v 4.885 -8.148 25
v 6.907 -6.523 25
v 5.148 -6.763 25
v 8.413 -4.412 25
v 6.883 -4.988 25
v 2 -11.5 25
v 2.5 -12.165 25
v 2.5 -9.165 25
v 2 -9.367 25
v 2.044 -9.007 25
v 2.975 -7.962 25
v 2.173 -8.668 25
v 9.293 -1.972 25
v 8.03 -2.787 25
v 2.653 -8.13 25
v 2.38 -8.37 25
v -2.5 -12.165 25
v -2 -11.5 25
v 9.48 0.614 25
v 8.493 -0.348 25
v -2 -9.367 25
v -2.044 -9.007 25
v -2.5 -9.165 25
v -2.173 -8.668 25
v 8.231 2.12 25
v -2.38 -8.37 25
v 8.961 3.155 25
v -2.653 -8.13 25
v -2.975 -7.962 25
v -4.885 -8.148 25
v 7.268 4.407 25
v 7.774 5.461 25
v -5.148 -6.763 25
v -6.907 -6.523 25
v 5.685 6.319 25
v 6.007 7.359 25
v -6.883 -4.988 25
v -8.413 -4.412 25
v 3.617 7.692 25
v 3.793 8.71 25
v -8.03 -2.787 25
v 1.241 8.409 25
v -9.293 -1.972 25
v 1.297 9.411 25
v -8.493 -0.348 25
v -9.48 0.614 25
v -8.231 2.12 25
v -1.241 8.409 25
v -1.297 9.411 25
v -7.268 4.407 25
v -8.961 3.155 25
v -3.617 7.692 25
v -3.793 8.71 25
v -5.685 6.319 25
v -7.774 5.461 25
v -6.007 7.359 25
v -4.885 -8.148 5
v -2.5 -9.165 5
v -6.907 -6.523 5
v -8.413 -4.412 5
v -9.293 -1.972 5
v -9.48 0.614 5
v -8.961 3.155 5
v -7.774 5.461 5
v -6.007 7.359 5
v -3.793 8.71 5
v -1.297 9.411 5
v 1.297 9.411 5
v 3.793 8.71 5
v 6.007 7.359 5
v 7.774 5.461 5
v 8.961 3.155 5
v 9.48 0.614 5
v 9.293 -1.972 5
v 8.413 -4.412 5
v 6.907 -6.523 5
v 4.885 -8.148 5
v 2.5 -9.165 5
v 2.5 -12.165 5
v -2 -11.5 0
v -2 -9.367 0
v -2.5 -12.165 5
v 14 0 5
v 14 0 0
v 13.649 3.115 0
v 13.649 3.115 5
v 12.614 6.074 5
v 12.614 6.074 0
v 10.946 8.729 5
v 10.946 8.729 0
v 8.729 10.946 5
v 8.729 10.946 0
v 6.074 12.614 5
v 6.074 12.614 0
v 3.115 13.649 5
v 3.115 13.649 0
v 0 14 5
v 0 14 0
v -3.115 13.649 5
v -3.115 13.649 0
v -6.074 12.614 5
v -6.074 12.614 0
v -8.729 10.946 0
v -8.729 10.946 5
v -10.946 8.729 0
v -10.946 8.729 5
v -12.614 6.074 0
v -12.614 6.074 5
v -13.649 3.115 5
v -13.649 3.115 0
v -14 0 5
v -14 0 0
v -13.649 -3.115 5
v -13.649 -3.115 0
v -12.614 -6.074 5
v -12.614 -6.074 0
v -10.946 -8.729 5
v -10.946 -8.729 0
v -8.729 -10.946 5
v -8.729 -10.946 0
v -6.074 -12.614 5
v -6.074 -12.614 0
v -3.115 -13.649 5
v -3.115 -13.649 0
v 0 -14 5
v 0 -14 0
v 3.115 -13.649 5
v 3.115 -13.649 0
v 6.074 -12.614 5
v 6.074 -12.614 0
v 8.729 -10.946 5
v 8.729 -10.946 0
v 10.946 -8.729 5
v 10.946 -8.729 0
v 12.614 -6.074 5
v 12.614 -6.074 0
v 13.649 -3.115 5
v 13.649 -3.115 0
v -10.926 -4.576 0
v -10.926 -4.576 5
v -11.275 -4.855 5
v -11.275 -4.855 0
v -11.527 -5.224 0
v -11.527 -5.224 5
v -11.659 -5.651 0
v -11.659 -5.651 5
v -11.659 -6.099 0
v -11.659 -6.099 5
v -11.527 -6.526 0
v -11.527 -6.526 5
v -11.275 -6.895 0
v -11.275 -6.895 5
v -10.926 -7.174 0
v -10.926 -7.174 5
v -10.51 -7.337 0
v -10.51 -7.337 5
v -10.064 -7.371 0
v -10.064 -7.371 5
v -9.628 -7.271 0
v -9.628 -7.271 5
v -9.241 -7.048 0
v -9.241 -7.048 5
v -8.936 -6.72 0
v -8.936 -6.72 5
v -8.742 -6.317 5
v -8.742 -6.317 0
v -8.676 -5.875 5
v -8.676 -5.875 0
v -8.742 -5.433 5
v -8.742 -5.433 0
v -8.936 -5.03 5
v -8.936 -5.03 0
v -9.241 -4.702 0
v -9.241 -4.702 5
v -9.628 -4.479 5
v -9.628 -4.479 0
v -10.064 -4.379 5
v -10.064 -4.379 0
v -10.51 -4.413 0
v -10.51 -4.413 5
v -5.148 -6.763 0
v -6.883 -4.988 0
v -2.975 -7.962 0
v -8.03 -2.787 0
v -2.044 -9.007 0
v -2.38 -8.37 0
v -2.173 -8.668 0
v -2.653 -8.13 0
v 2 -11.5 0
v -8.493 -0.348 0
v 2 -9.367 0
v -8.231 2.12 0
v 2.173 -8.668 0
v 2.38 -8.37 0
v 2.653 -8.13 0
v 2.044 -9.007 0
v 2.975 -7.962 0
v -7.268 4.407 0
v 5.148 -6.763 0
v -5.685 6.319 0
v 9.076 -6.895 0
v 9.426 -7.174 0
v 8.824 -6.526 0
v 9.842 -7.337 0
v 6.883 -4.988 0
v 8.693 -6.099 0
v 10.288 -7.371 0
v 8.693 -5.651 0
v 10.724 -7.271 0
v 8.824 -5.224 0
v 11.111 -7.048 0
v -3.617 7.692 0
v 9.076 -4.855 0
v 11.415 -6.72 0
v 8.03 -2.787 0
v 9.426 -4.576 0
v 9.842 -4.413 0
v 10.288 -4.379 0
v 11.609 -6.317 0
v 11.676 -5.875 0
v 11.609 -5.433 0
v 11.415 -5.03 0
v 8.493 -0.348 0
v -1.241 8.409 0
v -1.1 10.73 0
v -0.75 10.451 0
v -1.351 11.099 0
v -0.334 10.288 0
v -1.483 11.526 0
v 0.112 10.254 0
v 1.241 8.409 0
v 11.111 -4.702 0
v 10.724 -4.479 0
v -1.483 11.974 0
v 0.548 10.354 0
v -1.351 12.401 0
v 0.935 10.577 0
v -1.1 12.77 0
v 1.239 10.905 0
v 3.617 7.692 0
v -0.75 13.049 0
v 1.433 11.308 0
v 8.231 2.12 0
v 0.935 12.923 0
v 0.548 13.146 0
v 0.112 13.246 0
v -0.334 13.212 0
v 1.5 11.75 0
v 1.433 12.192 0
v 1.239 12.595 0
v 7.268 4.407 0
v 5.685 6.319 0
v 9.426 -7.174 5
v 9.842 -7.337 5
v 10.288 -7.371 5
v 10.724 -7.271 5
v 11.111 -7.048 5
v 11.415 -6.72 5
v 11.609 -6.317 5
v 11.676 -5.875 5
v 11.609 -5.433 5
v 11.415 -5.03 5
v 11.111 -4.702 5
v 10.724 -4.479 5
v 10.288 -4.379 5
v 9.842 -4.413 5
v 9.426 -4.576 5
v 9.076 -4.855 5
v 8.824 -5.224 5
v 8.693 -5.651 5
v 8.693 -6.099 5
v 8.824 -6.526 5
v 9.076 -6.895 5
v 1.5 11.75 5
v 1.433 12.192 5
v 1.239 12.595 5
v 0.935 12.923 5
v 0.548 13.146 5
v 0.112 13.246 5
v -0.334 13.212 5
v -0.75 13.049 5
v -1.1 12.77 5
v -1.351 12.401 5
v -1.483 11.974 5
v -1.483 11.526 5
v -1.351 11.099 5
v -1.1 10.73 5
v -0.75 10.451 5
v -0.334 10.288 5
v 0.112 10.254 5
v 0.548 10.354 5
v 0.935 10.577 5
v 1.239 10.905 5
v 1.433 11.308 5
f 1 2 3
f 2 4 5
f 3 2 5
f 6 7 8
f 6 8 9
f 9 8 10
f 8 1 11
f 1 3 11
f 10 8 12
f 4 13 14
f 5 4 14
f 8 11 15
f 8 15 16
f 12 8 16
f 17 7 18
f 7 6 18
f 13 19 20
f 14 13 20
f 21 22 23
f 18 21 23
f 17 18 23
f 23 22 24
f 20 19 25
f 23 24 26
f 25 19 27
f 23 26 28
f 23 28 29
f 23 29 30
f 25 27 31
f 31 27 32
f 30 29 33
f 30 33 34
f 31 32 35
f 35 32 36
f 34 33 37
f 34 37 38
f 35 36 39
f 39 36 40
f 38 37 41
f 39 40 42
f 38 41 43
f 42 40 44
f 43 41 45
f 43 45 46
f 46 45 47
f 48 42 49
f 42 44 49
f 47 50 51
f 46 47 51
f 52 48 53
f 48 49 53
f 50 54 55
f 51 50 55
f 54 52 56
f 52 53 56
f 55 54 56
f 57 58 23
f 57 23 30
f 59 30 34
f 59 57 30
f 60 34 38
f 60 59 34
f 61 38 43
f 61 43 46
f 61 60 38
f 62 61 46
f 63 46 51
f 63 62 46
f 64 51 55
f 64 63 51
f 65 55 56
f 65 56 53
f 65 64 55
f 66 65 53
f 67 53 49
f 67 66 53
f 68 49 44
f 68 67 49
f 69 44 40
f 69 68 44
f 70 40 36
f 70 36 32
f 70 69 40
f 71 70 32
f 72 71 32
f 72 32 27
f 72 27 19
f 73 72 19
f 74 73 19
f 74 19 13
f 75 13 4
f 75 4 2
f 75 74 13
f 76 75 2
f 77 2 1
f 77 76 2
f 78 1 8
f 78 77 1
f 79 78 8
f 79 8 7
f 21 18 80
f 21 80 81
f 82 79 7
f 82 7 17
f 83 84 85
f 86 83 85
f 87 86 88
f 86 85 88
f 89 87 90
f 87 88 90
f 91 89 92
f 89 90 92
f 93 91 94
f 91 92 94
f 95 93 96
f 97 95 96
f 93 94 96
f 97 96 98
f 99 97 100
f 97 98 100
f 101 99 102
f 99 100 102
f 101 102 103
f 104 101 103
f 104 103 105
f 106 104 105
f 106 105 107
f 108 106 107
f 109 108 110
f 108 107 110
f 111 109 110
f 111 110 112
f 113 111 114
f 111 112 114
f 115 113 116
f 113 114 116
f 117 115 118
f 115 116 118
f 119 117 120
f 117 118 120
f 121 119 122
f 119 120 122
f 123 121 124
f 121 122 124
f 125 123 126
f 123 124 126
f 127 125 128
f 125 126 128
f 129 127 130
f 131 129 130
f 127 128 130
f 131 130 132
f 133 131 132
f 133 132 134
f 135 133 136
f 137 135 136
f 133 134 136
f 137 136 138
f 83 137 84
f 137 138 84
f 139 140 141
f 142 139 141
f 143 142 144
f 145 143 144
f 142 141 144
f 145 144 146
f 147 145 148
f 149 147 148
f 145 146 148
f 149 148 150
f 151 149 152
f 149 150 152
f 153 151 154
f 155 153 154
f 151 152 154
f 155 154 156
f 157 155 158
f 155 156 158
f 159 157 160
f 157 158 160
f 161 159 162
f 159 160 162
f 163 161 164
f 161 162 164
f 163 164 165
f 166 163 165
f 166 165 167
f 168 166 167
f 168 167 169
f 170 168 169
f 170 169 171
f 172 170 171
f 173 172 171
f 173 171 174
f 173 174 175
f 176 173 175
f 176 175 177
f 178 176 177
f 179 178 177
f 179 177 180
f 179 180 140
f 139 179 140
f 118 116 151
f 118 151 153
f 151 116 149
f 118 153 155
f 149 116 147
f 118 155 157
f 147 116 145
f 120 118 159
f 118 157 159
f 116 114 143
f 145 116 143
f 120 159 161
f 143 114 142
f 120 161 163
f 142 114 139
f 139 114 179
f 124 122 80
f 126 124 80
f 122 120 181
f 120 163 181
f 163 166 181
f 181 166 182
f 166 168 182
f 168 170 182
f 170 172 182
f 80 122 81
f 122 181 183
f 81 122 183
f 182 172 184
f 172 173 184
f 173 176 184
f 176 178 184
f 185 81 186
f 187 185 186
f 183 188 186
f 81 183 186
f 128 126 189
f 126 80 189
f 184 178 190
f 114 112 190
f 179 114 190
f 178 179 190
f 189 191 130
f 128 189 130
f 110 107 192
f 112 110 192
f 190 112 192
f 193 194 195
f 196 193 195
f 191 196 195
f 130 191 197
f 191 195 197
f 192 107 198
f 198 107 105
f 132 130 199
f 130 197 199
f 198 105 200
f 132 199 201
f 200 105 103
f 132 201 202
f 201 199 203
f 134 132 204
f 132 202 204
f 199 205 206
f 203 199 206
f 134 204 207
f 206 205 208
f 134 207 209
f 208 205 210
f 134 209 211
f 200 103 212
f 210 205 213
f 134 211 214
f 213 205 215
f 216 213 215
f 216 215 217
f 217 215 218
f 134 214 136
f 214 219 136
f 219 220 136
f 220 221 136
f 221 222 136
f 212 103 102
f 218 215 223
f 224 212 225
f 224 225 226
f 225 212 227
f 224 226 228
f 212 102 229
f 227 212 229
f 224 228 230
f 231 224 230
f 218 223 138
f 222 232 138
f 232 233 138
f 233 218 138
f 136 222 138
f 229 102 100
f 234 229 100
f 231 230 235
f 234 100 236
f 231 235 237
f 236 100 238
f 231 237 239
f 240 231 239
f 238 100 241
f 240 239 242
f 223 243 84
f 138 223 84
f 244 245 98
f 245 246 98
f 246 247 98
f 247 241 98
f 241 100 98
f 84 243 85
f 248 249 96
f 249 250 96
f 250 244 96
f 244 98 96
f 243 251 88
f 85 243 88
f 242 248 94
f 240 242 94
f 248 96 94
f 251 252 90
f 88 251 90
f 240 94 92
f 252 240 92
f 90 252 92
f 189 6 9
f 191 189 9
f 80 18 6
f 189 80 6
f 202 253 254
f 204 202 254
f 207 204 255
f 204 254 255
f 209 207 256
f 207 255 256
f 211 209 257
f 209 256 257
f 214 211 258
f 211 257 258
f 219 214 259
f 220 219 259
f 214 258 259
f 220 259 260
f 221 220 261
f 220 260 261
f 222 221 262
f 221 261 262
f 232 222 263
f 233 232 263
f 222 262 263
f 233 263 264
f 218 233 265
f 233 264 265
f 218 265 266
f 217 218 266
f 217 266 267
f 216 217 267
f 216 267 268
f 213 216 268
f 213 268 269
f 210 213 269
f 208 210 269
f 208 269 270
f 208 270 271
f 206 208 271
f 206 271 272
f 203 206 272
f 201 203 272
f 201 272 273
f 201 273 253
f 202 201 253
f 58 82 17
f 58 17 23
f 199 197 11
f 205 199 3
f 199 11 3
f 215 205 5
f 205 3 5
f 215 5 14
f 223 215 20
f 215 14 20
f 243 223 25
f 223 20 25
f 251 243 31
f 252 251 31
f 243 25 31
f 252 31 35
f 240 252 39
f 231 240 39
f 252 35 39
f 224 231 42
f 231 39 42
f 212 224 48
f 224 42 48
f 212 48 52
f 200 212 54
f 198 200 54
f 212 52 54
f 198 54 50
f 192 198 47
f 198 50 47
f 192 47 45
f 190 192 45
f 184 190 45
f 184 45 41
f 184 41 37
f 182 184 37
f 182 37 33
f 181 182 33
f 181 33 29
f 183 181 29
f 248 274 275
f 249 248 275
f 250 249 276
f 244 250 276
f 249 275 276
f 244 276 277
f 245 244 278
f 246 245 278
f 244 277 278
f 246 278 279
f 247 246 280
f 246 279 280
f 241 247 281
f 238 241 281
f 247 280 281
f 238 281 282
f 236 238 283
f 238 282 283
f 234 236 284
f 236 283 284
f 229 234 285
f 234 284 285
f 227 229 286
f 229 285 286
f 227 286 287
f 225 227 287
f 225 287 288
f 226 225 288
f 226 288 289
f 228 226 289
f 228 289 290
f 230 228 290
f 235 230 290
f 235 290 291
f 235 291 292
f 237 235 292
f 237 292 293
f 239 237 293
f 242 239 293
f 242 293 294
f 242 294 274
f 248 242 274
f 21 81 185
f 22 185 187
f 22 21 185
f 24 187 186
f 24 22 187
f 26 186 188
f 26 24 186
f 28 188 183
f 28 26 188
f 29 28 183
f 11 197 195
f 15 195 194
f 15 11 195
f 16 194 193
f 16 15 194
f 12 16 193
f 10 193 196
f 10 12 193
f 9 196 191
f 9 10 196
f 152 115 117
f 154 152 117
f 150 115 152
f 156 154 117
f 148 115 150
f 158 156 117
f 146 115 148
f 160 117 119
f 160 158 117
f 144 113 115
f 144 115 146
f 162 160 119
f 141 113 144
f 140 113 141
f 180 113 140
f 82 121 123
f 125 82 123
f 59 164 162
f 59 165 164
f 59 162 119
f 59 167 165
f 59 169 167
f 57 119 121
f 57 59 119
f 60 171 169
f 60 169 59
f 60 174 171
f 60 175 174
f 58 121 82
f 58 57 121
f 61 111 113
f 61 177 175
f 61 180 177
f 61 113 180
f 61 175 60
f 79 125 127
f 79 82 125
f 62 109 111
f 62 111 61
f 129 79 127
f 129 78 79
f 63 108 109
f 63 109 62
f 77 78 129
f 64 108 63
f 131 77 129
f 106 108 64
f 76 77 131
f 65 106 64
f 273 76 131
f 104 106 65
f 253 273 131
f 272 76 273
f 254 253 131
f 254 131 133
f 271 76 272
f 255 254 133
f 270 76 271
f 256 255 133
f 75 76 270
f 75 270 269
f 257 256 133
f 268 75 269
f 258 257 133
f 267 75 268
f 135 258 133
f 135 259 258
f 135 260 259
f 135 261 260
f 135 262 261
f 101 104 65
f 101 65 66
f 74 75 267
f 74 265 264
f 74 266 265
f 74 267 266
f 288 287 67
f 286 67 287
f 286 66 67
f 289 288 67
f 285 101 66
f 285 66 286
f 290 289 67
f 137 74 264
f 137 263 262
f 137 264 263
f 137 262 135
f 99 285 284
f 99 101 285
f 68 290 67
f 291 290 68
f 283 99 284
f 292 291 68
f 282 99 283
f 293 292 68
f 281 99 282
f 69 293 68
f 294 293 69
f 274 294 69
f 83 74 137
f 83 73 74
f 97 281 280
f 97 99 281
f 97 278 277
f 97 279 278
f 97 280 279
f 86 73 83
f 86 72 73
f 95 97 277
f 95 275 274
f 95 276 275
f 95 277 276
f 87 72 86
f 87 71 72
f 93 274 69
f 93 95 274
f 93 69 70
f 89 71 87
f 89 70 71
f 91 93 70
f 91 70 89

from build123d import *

# Parameters (mm, degrees)
SKETCH1_R           = 14
BOSS_EXTRUDE1_DEPTH = 5
BOSS_EXTRUDE3_DEPTH = 20
SKETCH3_R           = 8.5
CUT_EXTRUDE1_DEPTH  = 26
SKETCH5_W           = 4
SKETCH5_H           = 11.5
CUT_EXTRUDE3_DEPTH  = 26
SKETCH6_R           = 1.5
CUT_EXTRUDE4_DEPTH  = 6
CIRPATTERN1_COUNT   = 3
FILLET1_R           = 1.5


with BuildPart() as part:
    # Sketch1 → Boss-Extrude1 (new body)
    with BuildSketch(Plane.XY):
        Circle(SKETCH1_R)
    extrude(amount=BOSS_EXTRUDE1_DEPTH)

    # Sketch2 → Boss-Extrude3 (add)
    with BuildSketch(Plane.XY.offset(5)):
        with BuildLine():
            Line((2.5, -9.16515139), (2.5, -12.16515139))
            Line((2.5, -12.16515139), (-2.5, -12.16515139))
            Line((-2.5, -12.16515139), (-2.5, -9.16515139))
            ThreePointArc((-2.5, -9.16515139), (0, 9.5), (2.5, -9.16515139))
        make_face()
    extrude(amount=BOSS_EXTRUDE3_DEPTH)

    # Sketch3 → Cut-Extrude1 (cut, through all)
    with BuildSketch(Plane.XY.offset(25)):
        Circle(SKETCH3_R)
    extrude(amount=-CUT_EXTRUDE1_DEPTH, mode=Mode.SUBTRACT)

    # Sketch5 → Cut-Extrude3 (cut, through all)
    with BuildSketch(Plane.XY.offset(25)):
        with Locations((0, -5.75)):
            Rectangle(SKETCH5_W, SKETCH5_H)
    extrude(amount=-CUT_EXTRUDE3_DEPTH, mode=Mode.SUBTRACT)

    # Sketch6 → Cut-Extrude4 (cut, through all)
    with BuildSketch(Plane.XY.offset(5)):
        with Locations((0, 11.75)):
            Circle(SKETCH6_R)
    cut_extrude4 = extrude(amount=-CUT_EXTRUDE4_DEPTH, mode=Mode.SUBTRACT)

    # CirPattern1: Cut-Extrude4 ×3 about axis
    cirpattern1_axis = Axis((0, 0, 0), (0, 0, 1))
    for i in range(1, CIRPATTERN1_COUNT):
        add(cut_extrude4.rotate(cirpattern1_axis, i * 360 / CIRPATTERN1_COUNT), mode=Mode.SUBTRACT)

    # Fillet1
    fillet1_edges = [part.edges().sort_by_distance(p)[0] for p in [
        (2, -8.261355821, 12.5),
        (-2, -8.261355821, 12.5),
    ]]
    fillet(fillet1_edges, radius=FILLET1_R)


solid = part.part
